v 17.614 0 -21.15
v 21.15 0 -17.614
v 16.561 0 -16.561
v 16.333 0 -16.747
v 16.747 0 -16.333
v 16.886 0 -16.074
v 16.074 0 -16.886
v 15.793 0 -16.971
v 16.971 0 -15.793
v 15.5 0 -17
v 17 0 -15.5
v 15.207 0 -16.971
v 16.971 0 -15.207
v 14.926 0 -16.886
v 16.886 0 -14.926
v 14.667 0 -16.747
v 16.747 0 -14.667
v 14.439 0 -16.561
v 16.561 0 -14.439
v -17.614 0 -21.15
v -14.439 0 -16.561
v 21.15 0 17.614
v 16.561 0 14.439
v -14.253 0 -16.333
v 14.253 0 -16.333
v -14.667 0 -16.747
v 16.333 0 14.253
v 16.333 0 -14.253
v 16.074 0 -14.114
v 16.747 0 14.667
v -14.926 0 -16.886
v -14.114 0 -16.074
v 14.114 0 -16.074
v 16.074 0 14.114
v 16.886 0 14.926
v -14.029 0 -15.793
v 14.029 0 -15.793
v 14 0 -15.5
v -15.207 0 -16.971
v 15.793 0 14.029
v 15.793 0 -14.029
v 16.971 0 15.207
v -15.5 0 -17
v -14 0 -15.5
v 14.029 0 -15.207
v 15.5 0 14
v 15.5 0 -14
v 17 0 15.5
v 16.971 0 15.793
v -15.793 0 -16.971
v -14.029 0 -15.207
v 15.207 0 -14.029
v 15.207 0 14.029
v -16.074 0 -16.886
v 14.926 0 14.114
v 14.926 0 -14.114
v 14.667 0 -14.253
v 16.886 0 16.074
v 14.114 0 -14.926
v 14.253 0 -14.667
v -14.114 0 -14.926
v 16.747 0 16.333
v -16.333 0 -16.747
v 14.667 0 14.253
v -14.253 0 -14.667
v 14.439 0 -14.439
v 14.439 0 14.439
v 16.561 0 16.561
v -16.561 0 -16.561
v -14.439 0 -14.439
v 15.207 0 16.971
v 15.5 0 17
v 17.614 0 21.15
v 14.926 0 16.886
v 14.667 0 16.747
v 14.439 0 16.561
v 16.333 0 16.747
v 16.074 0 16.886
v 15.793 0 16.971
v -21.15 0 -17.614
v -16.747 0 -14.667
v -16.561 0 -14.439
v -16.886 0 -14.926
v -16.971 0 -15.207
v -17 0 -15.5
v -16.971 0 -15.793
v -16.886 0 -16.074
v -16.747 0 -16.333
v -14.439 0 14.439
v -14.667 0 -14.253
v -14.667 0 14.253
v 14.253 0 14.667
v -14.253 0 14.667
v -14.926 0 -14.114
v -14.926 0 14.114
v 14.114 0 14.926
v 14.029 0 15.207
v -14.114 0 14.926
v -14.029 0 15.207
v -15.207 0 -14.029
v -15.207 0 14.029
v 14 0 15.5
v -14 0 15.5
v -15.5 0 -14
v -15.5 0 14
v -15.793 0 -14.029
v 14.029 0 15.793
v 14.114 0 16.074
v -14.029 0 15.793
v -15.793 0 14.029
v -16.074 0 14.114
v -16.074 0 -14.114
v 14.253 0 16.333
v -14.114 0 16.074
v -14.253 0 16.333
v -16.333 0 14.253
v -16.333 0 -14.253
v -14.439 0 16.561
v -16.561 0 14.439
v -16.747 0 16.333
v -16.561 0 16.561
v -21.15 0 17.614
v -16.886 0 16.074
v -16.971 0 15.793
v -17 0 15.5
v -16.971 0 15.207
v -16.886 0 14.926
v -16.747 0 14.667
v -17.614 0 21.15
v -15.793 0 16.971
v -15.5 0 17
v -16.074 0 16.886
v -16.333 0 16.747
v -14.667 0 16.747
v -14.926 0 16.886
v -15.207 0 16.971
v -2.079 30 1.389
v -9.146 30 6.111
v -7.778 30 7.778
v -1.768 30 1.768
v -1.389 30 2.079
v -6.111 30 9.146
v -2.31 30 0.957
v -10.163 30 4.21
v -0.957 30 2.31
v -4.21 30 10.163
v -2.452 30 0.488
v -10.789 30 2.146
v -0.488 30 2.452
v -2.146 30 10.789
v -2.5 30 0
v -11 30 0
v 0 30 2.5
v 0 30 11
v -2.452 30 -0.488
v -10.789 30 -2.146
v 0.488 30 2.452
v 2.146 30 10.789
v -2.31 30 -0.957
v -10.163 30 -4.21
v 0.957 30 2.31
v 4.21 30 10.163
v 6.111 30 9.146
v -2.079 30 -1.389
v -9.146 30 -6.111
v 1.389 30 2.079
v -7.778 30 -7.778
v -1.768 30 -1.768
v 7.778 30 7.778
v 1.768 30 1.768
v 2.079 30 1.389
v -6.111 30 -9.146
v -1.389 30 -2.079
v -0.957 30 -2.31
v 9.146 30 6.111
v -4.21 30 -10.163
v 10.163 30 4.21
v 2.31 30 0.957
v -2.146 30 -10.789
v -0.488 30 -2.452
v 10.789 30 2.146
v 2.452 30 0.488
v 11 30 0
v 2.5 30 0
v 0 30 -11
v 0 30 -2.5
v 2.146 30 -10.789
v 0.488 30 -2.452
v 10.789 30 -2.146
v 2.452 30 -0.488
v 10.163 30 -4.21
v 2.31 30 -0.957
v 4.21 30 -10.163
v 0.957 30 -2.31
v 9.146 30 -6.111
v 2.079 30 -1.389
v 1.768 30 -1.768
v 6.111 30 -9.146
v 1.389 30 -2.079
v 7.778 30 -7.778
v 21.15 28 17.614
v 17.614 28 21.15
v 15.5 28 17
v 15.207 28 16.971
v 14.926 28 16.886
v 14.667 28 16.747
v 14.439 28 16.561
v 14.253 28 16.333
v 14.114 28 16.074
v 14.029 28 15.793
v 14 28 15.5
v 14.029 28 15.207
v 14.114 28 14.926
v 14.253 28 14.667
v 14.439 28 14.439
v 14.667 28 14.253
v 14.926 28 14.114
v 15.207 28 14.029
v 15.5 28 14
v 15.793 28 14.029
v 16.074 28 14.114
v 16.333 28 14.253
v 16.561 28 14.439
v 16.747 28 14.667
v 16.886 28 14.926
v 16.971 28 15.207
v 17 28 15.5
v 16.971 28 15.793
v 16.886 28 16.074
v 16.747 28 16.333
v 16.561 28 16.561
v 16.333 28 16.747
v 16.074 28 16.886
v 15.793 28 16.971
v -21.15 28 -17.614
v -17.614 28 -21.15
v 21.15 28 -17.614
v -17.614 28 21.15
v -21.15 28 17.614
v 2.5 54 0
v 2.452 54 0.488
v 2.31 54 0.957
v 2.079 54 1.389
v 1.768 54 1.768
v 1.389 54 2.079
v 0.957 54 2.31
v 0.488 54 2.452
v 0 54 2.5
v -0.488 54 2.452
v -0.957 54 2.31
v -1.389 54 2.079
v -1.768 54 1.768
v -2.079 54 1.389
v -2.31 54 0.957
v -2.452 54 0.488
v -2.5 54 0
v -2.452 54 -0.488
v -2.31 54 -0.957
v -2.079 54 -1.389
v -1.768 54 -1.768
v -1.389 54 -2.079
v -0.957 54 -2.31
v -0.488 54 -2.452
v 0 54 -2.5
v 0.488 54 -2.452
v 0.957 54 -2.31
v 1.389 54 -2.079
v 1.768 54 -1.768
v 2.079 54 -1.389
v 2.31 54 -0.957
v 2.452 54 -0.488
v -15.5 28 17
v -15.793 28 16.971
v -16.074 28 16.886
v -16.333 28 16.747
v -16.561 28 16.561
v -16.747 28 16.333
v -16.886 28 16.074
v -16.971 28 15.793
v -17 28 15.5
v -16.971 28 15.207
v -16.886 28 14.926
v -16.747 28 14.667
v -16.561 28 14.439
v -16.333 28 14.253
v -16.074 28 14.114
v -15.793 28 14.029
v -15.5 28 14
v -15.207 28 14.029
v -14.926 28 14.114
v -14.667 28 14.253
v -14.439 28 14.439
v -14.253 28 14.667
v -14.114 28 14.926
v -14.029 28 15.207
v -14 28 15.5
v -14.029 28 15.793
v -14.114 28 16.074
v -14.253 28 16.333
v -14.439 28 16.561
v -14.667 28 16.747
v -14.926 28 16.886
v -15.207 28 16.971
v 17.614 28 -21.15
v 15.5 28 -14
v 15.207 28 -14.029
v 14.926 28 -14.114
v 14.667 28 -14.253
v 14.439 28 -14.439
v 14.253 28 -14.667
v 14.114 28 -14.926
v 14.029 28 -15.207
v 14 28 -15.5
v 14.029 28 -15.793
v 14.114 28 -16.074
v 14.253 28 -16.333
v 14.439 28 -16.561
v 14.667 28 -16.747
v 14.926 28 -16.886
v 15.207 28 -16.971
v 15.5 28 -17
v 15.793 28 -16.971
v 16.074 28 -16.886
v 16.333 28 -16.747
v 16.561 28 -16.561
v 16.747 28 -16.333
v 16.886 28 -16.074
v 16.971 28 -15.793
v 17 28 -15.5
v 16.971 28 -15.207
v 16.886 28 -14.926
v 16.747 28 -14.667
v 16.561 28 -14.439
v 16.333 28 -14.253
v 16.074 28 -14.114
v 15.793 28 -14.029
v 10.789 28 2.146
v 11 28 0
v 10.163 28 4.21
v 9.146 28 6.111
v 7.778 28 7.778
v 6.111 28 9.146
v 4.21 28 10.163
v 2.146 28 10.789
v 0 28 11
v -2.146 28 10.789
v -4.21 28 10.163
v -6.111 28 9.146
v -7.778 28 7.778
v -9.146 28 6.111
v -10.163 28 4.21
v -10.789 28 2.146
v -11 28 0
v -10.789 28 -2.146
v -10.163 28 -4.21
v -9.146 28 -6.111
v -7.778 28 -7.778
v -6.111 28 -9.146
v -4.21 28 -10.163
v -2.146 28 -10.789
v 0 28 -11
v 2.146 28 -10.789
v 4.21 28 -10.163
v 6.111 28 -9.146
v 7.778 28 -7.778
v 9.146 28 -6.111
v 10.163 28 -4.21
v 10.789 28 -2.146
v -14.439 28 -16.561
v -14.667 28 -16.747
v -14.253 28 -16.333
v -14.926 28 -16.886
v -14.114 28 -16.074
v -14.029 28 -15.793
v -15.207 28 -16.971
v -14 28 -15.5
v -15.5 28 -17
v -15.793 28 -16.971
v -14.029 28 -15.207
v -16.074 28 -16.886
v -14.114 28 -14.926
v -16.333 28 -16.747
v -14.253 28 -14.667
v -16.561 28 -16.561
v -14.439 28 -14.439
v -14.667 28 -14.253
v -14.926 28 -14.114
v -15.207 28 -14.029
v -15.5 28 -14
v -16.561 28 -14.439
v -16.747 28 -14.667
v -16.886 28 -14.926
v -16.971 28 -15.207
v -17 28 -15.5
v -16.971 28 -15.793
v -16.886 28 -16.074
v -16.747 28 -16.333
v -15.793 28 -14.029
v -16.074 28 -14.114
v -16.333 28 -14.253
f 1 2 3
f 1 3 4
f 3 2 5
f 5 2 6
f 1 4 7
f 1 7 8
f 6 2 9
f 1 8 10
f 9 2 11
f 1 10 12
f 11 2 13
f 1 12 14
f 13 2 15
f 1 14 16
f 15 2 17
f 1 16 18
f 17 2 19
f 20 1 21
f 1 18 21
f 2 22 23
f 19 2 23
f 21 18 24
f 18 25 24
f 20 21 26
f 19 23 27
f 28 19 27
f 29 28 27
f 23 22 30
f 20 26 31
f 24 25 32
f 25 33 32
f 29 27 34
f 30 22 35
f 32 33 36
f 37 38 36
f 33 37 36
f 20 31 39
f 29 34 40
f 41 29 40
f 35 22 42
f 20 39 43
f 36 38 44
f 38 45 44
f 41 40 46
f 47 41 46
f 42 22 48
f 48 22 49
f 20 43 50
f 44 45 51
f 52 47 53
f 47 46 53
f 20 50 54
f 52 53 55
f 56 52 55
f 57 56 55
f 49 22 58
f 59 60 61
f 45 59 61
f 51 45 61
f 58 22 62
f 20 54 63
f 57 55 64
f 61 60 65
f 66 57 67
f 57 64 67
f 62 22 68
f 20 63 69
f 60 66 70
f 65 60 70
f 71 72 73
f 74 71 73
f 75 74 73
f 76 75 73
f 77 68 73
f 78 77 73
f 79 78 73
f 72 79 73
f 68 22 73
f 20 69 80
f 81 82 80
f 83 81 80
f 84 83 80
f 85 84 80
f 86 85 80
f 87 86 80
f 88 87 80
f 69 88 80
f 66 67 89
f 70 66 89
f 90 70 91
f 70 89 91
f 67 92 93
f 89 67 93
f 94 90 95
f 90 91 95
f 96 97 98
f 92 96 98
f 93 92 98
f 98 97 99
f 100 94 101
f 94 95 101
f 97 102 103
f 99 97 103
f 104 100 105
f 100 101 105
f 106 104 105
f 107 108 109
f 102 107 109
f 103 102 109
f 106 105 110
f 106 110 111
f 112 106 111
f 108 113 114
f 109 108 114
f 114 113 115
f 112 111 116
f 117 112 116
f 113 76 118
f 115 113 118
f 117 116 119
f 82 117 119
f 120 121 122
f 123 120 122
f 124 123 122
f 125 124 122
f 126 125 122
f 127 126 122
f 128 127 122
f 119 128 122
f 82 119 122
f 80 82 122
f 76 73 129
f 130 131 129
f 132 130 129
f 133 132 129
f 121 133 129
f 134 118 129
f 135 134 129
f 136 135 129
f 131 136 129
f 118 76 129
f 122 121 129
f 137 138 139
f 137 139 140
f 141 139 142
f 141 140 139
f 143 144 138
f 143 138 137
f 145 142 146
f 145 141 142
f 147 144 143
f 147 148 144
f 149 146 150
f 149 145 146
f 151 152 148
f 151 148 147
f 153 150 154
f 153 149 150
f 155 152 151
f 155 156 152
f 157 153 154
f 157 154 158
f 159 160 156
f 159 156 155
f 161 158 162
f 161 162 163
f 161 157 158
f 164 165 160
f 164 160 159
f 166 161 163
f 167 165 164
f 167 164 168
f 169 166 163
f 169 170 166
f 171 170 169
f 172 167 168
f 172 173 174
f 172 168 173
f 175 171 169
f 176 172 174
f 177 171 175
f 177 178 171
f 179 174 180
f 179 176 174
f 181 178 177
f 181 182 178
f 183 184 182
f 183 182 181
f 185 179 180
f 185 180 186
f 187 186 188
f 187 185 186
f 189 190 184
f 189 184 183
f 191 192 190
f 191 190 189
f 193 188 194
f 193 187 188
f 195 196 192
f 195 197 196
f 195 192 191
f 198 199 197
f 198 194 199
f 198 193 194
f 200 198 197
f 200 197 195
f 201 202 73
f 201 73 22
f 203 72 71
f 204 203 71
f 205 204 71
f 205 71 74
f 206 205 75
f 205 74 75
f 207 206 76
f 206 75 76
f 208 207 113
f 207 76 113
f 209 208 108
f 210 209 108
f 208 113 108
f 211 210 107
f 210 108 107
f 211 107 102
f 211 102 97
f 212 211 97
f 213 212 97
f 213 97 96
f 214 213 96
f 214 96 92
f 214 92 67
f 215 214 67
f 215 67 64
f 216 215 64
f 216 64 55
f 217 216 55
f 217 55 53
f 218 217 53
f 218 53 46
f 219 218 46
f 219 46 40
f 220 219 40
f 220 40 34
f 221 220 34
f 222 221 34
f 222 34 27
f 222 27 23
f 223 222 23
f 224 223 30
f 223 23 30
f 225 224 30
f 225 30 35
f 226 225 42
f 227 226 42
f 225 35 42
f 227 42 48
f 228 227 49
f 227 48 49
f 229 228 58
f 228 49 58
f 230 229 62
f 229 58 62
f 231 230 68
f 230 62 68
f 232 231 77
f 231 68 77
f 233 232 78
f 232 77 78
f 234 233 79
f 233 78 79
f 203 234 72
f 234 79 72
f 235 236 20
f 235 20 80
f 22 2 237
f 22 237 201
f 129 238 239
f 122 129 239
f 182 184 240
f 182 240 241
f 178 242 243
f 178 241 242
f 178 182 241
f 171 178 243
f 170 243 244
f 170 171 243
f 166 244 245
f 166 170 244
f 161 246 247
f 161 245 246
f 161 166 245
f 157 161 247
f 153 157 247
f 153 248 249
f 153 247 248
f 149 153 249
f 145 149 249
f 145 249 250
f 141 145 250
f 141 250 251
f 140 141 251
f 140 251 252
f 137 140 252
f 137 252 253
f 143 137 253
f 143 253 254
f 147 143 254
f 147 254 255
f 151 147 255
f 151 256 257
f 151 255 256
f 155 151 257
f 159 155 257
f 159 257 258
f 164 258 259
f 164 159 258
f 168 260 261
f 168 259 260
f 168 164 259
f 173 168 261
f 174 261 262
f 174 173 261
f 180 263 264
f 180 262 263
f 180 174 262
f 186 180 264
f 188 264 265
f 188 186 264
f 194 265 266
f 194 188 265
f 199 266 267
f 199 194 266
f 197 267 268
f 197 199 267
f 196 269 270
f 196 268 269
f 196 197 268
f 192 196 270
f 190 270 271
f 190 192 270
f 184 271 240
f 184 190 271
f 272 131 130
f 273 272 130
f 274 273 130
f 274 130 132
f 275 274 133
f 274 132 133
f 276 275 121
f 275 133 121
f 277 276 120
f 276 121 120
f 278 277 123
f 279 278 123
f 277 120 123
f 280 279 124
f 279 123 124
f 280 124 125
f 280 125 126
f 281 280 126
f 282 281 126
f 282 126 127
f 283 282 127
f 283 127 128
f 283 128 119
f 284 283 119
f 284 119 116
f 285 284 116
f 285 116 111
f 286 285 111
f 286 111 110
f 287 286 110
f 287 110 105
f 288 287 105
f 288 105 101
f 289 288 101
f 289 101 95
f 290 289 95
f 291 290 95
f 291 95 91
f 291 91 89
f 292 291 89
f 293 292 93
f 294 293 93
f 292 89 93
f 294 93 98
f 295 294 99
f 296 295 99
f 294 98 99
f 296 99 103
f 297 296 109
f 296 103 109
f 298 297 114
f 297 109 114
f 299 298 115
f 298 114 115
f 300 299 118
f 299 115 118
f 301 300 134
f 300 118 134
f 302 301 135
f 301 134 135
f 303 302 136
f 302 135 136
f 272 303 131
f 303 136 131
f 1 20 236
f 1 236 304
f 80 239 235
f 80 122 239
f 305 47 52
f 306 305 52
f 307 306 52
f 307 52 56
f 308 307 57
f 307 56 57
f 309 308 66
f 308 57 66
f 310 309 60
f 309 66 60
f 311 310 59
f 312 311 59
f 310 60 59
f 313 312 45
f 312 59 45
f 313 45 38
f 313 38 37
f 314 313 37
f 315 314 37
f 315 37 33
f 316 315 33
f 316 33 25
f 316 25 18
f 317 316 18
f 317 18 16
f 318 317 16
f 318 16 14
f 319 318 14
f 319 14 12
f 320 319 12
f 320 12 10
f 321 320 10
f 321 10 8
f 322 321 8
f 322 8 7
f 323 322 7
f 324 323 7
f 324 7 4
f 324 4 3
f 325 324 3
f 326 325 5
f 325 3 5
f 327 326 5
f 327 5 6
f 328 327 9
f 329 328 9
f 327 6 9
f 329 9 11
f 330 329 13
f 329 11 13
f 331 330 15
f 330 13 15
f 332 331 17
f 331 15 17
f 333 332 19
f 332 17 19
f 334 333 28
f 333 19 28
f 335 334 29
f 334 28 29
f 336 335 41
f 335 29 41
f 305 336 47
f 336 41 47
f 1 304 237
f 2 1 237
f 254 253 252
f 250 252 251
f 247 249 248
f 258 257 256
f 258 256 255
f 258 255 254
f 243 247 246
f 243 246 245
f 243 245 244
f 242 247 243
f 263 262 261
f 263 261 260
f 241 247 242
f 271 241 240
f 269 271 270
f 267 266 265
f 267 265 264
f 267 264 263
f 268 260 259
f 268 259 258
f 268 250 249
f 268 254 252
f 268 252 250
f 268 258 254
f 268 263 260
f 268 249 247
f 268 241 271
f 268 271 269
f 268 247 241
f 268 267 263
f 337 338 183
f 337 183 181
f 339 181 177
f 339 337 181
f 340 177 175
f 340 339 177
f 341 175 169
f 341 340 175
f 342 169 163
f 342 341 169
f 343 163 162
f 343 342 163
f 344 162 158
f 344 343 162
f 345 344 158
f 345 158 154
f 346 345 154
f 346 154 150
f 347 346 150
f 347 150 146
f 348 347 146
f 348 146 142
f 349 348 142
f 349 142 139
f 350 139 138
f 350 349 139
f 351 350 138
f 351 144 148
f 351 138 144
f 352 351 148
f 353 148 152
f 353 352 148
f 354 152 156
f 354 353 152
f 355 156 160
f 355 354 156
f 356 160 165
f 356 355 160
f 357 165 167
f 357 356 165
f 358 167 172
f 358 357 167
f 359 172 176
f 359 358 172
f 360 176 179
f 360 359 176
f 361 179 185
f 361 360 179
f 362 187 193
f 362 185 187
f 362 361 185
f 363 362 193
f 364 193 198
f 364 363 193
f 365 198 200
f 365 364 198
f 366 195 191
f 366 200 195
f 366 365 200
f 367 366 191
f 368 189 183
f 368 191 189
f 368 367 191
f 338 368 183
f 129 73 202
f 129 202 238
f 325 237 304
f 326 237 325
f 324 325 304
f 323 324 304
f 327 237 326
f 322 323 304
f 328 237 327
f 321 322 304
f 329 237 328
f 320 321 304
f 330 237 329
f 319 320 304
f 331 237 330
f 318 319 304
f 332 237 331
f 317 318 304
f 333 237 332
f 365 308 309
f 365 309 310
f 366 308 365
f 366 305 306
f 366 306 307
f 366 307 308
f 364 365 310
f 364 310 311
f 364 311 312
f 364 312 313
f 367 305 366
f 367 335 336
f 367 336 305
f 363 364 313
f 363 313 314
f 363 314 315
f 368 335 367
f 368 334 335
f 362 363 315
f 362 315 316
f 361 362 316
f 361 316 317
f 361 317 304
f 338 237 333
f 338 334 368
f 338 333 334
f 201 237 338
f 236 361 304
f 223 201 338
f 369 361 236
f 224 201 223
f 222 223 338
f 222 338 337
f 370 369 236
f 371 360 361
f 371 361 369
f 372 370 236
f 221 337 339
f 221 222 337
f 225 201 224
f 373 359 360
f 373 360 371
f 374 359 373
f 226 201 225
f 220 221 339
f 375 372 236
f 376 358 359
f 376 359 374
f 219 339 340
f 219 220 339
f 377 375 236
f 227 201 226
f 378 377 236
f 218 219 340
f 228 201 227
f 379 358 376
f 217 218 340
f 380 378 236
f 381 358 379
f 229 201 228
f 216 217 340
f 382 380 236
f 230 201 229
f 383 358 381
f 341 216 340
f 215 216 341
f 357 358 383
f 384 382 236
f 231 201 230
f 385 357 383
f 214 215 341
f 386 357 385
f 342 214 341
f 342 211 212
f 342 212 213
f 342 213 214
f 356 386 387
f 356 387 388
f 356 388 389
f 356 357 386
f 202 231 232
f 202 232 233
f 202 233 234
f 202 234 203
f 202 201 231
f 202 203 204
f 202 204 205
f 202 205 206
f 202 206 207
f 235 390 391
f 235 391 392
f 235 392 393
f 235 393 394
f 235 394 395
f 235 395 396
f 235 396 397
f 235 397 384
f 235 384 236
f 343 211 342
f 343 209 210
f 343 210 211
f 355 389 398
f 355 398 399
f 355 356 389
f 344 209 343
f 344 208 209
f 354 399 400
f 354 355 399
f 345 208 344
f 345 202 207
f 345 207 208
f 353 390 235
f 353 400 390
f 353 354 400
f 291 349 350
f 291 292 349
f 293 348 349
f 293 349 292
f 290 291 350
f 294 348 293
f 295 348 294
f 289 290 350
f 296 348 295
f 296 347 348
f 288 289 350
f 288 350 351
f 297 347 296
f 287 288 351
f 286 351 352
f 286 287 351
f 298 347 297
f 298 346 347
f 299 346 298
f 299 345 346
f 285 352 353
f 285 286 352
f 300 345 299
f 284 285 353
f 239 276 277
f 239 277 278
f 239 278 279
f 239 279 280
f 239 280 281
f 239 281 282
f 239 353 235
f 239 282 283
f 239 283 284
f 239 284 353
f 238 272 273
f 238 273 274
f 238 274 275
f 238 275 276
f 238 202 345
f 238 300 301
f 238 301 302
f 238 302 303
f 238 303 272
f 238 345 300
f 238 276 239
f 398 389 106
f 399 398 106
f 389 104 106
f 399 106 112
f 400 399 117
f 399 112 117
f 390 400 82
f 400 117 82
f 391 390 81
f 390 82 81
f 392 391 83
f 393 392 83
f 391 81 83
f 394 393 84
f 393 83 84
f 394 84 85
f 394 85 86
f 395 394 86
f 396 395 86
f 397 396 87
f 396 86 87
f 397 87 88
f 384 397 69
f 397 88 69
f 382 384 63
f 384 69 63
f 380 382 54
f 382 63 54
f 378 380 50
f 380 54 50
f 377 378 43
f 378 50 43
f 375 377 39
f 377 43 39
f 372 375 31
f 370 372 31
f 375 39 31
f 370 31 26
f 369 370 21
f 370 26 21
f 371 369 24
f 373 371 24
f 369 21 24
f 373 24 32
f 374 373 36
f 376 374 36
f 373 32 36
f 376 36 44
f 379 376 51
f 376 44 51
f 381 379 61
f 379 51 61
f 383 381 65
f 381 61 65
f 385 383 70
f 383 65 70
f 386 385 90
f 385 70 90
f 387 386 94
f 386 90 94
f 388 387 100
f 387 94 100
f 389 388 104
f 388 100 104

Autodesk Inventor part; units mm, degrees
ref_plane "YZ Plane" through (0, 0, 0) normal (1, 0, 0) x (0, 1, 0)
ref_plane "XZ Plane" through (0, 0, 0) normal (0, 1, 0) x (-1, 0, 0)
ref_plane "XY Plane" through (0, 0, 0) normal (0, 0, 1) x (1, 0, 0)
sketch "Sketch2" plane through (0, 0, 0) normal (0, 1, 0) x (-1, 0, 0)
  line L0 (-21.15, 21.15) -> (21.15, 21.15)
  line L1 (21.15, 21.15) -> (21.15, -21.15)
  line L2 (21.15, -21.15) -> (-21.15, -21.15)
  line L3 (-21.15, -21.15) -> (-21.15, 21.15)
  line L4 (-21.15, 21.15) -> (21.15, -21.15) construction
  line L5 (21.15, 21.15) -> (-21.15, -21.15) construction
  point P0 (0, 0)
  dimension "d0" = 42.3
  dimension "d1" = 42.3
extrude "Extrusion1" add sketch "Sketch2" along normal blind 28
sketch "Sketch3" plane through (0, 28, 0) normal (0, 1, 0) x (1, 0, 0)
  circle A0 centre (0, 0) radius 11
  dimension "d4" = 22
extrude "Extrusion2" add sketch "Sketch3" along normal blind 2
sketch "Sketch4" plane through (0, 28, 0) normal (0, 1, 0) x (1, 0, 0)
  line L0 (-24.8242, 0) -> (26.7617, 0) construction
  line L1 (0, -32.5742) -> (0, 40.8086) construction
  point P0 (0, 0)
  point P1 (-15.5, -15.5)
  point P2 (-15.5, 15.5)
  point P3 (15.5, -15.5)
  point P4 (15.5, 15.5)
  dimension "d7" = 15.5
  dimension "d8" = 15.5
  dimension "d9" = 0
  dimension "d10" = 0
  dimension "d11" = 26.7617
  dimension "d12" = 40.8086
  dimension "d13" = 32.5742
  dimension "d14" = 24.8242
hole "Hole1" at (-15.5, 28, 15.5) at (-15.5, 28, -15.5) at (15.5, 28, 15.5) at (15.5, 28, -15.5) direction (0, -1, 0) diameter 3 end through all
sketch "Sketch5" plane through (0, 30, 0) normal (0, 1, 0) x (1, 0, 0)
  circle A0 centre (0, 0) radius 2.5
  dimension "d22" = 5
extrude "Extrusion3" add sketch "Sketch5" along normal blind 24
sketch "Sketch6" plane through (0, 28, 0) normal (0, 1, 0) x (1, 0, 0)
  line L0 (-21.15, -21.15) -> (21.15, -21.15) construction
  line L1 (-21.15, 21.15) -> (-21.15, -21.15) construction
  line L2 (21.15, -21.15) -> (21.15, 21.15) construction
  line L3 (21.15, 21.15) -> (-21.15, 21.15) construction
  line L4 (-17.6145, -21.15) -> (-21.15, -17.6145)
  line L5 (-24, 0) -> (25, 0) construction
  line L6 (0, -28) -> (0, 33.5057) construction
  line L7 (-17.6145, 21.15) -> (-21.15, 17.6145)
  line L8 (17.6145, -21.15) -> (21.15, -17.6145)
  line L9 (17.6145, 21.15) -> (21.15, 17.6145)
  line L10 (-17.6145, -21.15) -> (-21.15, -21.15)
  line L11 (-21.15, -21.15) -> (-21.15, -17.6145)
  line L12 (-21.15, -21.15) -> (-21.15, 21.15) projected
  line L13 (-21.15, 21.15) -> (21.15, 21.15) projected
  line L14 (-17.6145, 21.15) -> (-21.15, 21.15)
  line L15 (-21.15, 21.15) -> (-21.15, 17.6145)
  line L16 (21.15, 21.15) -> (21.15, -21.15) construction
  line L17 (21.15, 17.6145) -> (21.15, 21.15)
  line L18 (21.15, 21.15) -> (17.6145, 21.15)
  line L19 (21.15, -21.15) -> (-21.15, -21.15) projected
  line L20 (17.6145, -21.15) -> (21.15, -21.15)
  line L21 (21.15, -21.15) -> (21.15, -17.6145)
  point P0 (0, 0)
  dimension "d25" = 5
  dimension "d33" = 3.5355
  dimension "d34" = 3.5355
  dimension "d35" = 3.5355
extrude "Extrusion4" cut sketch "Sketch6" against normal up to surface (28 mm away)
equation "\"d33\" = d34"
properties part number "Motor" material "Aluminum 6061"
